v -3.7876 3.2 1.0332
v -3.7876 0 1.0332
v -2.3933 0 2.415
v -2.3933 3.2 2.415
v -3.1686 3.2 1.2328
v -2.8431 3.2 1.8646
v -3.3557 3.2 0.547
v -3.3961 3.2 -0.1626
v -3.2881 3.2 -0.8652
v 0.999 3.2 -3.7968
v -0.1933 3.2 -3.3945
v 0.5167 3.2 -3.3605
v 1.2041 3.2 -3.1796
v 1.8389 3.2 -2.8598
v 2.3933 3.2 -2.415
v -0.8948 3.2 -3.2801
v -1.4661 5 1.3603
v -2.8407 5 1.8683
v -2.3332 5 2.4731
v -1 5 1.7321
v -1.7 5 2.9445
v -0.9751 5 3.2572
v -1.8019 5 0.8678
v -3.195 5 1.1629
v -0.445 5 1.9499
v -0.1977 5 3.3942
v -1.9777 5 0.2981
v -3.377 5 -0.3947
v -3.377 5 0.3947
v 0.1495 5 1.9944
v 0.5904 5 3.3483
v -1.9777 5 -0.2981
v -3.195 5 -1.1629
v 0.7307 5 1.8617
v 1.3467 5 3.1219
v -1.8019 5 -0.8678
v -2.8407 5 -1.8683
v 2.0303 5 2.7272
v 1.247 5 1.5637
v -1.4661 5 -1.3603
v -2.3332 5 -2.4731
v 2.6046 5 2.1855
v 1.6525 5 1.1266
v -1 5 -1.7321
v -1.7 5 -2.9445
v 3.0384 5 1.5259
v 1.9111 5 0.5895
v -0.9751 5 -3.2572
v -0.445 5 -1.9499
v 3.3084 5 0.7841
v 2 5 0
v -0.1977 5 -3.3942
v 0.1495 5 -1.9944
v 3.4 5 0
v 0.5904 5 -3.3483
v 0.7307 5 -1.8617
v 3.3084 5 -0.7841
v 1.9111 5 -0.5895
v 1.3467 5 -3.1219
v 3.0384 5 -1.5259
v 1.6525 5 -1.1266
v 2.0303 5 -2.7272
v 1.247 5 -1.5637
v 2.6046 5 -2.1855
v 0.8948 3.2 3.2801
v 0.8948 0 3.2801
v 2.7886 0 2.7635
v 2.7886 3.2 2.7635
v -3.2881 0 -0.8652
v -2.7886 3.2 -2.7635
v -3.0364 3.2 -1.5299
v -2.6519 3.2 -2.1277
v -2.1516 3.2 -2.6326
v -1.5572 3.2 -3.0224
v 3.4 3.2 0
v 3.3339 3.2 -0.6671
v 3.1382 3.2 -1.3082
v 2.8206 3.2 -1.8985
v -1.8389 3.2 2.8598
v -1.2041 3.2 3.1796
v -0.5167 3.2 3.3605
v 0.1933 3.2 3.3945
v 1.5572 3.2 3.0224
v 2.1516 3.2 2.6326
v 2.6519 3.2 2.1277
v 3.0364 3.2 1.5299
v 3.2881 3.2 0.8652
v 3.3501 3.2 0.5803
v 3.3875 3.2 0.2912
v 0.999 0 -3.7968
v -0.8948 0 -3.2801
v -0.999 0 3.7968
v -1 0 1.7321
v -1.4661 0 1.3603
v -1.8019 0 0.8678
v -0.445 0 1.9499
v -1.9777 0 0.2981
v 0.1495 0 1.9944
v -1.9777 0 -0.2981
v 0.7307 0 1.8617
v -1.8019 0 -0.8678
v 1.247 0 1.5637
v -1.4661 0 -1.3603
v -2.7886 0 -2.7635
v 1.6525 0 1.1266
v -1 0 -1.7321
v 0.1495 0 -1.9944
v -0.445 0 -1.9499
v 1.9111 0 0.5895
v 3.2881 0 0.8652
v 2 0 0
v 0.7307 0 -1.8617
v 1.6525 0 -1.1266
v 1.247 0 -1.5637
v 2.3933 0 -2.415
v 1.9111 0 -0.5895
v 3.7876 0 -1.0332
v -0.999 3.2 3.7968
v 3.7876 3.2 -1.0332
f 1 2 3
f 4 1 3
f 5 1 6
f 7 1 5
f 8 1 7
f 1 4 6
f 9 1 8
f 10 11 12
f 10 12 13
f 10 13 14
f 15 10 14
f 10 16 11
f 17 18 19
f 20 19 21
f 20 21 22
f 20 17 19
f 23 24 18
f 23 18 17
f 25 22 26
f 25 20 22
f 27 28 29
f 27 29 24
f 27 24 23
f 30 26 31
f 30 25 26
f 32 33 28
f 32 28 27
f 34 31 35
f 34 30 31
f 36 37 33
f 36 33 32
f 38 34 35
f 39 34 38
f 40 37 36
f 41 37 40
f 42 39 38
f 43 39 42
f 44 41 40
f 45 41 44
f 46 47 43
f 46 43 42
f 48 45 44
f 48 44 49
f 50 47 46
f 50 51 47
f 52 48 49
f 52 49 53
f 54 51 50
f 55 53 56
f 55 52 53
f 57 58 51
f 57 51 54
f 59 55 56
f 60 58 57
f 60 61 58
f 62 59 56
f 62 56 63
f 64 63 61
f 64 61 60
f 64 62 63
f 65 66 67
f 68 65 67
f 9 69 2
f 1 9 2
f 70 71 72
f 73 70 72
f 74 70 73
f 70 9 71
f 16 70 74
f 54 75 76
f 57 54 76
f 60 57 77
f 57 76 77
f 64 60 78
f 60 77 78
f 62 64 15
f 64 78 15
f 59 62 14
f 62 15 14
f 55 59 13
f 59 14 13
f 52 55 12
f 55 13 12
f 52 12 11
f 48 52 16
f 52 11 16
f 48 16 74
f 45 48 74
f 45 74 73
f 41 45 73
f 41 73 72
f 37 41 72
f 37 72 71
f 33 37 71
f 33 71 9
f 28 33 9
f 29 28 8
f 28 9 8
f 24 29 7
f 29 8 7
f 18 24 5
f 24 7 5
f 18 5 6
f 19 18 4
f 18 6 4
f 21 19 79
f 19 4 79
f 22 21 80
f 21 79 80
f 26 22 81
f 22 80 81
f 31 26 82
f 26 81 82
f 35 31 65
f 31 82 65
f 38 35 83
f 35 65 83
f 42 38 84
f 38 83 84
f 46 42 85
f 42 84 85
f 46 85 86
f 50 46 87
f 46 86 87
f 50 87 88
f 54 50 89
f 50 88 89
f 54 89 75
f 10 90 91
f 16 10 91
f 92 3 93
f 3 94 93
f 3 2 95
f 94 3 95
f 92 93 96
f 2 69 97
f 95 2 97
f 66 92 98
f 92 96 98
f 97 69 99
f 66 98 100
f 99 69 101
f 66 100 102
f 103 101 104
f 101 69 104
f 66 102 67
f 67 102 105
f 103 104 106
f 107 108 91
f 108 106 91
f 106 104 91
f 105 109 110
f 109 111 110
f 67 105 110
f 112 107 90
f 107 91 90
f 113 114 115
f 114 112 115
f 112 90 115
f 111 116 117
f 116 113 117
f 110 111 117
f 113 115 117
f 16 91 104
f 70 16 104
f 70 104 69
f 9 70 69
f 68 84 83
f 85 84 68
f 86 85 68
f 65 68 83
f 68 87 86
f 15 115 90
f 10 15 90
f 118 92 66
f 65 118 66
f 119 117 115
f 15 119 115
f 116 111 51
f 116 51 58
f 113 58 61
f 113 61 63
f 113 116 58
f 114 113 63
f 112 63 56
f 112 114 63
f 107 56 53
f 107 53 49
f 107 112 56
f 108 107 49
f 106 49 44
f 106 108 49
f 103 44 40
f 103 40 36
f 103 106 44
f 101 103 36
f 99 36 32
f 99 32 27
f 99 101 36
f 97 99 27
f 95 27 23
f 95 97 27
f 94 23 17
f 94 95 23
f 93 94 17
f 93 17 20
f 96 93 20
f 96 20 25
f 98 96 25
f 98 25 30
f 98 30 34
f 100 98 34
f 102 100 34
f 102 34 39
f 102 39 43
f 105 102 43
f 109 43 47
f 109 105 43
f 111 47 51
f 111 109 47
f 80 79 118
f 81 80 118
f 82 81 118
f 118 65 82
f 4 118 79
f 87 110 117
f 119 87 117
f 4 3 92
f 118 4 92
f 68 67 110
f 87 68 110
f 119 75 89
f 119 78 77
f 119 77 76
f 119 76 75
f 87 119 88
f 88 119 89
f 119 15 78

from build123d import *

# Parameters (mm, degrees)
EXTRUDE_1_DEPTH     = 3.2
EXTRUDE_2_DEPTH     = 5
SKETCH_2_R          = 2
CUT_EXTRUDE_1_DEPTH = 5


with BuildPart() as part:
    # 草图1 → 凸台-拉伸1 (new body)
    with BuildSketch(Plane(origin=(0, 0, 0), x_dir=(1, 0, 0), z_dir=(0, 1, 0))):
        Polygon((3.787584707, 1.033216056), (0.999001002, 3.796752603), (-2.788583706, 2.763536548), (-3.787584707, -1.033216056), (-0.999001002, -3.796752603), (2.788583706, -2.763536548), align=None)
    extrude(amount=EXTRUDE_1_DEPTH)

    # 草图1<3> → 凸台-拉伸2 (add)
    with BuildSketch(Plane(origin=(0, 0, 0), x_dir=(1, 0, 0), z_dir=(0, 1, 0))):
        with BuildLine():
            ThreePointArc((3.4, 0), (3.13824753, 1.308205811), (2.39329268, 2.414984502))
            ThreePointArc((2.39329268, 2.414984502), (0.865160253, 3.288084205), (-0.894791101, 3.280144644))
            ThreePointArc((-0.894791101, 3.280144644), (-2.414984144, 2.393293042), (-3.288084139, 0.865160504))
            ThreePointArc((-3.288084139, 0.865160504), (-3.280144574, -0.894791357), (-2.393292658, -2.414984524))
            ThreePointArc((-2.393292658, -2.414984524), (-0.865160223, -3.288084212), (0.894791131, -3.280144636))
            ThreePointArc((0.894791131, -3.280144636), (2.414984165, -2.39329302), (3.288084146, -0.865160476))
            ThreePointArc((3.288084146, -0.865160476), (3.371904958, -0.436184539), (3.4, 0))
        make_face()
    extrude(amount=EXTRUDE_2_DEPTH)

    # 草图2 → 切除-拉伸1 (cut)
    with BuildSketch(Plane(origin=(0, 0, 0), x_dir=(1, 0, 0), z_dir=(0, 1, 0))):
        Circle(SKETCH_2_R)
    extrude(amount=CUT_EXTRUDE_1_DEPTH, mode=Mode.SUBTRACT)


solid = part.part
